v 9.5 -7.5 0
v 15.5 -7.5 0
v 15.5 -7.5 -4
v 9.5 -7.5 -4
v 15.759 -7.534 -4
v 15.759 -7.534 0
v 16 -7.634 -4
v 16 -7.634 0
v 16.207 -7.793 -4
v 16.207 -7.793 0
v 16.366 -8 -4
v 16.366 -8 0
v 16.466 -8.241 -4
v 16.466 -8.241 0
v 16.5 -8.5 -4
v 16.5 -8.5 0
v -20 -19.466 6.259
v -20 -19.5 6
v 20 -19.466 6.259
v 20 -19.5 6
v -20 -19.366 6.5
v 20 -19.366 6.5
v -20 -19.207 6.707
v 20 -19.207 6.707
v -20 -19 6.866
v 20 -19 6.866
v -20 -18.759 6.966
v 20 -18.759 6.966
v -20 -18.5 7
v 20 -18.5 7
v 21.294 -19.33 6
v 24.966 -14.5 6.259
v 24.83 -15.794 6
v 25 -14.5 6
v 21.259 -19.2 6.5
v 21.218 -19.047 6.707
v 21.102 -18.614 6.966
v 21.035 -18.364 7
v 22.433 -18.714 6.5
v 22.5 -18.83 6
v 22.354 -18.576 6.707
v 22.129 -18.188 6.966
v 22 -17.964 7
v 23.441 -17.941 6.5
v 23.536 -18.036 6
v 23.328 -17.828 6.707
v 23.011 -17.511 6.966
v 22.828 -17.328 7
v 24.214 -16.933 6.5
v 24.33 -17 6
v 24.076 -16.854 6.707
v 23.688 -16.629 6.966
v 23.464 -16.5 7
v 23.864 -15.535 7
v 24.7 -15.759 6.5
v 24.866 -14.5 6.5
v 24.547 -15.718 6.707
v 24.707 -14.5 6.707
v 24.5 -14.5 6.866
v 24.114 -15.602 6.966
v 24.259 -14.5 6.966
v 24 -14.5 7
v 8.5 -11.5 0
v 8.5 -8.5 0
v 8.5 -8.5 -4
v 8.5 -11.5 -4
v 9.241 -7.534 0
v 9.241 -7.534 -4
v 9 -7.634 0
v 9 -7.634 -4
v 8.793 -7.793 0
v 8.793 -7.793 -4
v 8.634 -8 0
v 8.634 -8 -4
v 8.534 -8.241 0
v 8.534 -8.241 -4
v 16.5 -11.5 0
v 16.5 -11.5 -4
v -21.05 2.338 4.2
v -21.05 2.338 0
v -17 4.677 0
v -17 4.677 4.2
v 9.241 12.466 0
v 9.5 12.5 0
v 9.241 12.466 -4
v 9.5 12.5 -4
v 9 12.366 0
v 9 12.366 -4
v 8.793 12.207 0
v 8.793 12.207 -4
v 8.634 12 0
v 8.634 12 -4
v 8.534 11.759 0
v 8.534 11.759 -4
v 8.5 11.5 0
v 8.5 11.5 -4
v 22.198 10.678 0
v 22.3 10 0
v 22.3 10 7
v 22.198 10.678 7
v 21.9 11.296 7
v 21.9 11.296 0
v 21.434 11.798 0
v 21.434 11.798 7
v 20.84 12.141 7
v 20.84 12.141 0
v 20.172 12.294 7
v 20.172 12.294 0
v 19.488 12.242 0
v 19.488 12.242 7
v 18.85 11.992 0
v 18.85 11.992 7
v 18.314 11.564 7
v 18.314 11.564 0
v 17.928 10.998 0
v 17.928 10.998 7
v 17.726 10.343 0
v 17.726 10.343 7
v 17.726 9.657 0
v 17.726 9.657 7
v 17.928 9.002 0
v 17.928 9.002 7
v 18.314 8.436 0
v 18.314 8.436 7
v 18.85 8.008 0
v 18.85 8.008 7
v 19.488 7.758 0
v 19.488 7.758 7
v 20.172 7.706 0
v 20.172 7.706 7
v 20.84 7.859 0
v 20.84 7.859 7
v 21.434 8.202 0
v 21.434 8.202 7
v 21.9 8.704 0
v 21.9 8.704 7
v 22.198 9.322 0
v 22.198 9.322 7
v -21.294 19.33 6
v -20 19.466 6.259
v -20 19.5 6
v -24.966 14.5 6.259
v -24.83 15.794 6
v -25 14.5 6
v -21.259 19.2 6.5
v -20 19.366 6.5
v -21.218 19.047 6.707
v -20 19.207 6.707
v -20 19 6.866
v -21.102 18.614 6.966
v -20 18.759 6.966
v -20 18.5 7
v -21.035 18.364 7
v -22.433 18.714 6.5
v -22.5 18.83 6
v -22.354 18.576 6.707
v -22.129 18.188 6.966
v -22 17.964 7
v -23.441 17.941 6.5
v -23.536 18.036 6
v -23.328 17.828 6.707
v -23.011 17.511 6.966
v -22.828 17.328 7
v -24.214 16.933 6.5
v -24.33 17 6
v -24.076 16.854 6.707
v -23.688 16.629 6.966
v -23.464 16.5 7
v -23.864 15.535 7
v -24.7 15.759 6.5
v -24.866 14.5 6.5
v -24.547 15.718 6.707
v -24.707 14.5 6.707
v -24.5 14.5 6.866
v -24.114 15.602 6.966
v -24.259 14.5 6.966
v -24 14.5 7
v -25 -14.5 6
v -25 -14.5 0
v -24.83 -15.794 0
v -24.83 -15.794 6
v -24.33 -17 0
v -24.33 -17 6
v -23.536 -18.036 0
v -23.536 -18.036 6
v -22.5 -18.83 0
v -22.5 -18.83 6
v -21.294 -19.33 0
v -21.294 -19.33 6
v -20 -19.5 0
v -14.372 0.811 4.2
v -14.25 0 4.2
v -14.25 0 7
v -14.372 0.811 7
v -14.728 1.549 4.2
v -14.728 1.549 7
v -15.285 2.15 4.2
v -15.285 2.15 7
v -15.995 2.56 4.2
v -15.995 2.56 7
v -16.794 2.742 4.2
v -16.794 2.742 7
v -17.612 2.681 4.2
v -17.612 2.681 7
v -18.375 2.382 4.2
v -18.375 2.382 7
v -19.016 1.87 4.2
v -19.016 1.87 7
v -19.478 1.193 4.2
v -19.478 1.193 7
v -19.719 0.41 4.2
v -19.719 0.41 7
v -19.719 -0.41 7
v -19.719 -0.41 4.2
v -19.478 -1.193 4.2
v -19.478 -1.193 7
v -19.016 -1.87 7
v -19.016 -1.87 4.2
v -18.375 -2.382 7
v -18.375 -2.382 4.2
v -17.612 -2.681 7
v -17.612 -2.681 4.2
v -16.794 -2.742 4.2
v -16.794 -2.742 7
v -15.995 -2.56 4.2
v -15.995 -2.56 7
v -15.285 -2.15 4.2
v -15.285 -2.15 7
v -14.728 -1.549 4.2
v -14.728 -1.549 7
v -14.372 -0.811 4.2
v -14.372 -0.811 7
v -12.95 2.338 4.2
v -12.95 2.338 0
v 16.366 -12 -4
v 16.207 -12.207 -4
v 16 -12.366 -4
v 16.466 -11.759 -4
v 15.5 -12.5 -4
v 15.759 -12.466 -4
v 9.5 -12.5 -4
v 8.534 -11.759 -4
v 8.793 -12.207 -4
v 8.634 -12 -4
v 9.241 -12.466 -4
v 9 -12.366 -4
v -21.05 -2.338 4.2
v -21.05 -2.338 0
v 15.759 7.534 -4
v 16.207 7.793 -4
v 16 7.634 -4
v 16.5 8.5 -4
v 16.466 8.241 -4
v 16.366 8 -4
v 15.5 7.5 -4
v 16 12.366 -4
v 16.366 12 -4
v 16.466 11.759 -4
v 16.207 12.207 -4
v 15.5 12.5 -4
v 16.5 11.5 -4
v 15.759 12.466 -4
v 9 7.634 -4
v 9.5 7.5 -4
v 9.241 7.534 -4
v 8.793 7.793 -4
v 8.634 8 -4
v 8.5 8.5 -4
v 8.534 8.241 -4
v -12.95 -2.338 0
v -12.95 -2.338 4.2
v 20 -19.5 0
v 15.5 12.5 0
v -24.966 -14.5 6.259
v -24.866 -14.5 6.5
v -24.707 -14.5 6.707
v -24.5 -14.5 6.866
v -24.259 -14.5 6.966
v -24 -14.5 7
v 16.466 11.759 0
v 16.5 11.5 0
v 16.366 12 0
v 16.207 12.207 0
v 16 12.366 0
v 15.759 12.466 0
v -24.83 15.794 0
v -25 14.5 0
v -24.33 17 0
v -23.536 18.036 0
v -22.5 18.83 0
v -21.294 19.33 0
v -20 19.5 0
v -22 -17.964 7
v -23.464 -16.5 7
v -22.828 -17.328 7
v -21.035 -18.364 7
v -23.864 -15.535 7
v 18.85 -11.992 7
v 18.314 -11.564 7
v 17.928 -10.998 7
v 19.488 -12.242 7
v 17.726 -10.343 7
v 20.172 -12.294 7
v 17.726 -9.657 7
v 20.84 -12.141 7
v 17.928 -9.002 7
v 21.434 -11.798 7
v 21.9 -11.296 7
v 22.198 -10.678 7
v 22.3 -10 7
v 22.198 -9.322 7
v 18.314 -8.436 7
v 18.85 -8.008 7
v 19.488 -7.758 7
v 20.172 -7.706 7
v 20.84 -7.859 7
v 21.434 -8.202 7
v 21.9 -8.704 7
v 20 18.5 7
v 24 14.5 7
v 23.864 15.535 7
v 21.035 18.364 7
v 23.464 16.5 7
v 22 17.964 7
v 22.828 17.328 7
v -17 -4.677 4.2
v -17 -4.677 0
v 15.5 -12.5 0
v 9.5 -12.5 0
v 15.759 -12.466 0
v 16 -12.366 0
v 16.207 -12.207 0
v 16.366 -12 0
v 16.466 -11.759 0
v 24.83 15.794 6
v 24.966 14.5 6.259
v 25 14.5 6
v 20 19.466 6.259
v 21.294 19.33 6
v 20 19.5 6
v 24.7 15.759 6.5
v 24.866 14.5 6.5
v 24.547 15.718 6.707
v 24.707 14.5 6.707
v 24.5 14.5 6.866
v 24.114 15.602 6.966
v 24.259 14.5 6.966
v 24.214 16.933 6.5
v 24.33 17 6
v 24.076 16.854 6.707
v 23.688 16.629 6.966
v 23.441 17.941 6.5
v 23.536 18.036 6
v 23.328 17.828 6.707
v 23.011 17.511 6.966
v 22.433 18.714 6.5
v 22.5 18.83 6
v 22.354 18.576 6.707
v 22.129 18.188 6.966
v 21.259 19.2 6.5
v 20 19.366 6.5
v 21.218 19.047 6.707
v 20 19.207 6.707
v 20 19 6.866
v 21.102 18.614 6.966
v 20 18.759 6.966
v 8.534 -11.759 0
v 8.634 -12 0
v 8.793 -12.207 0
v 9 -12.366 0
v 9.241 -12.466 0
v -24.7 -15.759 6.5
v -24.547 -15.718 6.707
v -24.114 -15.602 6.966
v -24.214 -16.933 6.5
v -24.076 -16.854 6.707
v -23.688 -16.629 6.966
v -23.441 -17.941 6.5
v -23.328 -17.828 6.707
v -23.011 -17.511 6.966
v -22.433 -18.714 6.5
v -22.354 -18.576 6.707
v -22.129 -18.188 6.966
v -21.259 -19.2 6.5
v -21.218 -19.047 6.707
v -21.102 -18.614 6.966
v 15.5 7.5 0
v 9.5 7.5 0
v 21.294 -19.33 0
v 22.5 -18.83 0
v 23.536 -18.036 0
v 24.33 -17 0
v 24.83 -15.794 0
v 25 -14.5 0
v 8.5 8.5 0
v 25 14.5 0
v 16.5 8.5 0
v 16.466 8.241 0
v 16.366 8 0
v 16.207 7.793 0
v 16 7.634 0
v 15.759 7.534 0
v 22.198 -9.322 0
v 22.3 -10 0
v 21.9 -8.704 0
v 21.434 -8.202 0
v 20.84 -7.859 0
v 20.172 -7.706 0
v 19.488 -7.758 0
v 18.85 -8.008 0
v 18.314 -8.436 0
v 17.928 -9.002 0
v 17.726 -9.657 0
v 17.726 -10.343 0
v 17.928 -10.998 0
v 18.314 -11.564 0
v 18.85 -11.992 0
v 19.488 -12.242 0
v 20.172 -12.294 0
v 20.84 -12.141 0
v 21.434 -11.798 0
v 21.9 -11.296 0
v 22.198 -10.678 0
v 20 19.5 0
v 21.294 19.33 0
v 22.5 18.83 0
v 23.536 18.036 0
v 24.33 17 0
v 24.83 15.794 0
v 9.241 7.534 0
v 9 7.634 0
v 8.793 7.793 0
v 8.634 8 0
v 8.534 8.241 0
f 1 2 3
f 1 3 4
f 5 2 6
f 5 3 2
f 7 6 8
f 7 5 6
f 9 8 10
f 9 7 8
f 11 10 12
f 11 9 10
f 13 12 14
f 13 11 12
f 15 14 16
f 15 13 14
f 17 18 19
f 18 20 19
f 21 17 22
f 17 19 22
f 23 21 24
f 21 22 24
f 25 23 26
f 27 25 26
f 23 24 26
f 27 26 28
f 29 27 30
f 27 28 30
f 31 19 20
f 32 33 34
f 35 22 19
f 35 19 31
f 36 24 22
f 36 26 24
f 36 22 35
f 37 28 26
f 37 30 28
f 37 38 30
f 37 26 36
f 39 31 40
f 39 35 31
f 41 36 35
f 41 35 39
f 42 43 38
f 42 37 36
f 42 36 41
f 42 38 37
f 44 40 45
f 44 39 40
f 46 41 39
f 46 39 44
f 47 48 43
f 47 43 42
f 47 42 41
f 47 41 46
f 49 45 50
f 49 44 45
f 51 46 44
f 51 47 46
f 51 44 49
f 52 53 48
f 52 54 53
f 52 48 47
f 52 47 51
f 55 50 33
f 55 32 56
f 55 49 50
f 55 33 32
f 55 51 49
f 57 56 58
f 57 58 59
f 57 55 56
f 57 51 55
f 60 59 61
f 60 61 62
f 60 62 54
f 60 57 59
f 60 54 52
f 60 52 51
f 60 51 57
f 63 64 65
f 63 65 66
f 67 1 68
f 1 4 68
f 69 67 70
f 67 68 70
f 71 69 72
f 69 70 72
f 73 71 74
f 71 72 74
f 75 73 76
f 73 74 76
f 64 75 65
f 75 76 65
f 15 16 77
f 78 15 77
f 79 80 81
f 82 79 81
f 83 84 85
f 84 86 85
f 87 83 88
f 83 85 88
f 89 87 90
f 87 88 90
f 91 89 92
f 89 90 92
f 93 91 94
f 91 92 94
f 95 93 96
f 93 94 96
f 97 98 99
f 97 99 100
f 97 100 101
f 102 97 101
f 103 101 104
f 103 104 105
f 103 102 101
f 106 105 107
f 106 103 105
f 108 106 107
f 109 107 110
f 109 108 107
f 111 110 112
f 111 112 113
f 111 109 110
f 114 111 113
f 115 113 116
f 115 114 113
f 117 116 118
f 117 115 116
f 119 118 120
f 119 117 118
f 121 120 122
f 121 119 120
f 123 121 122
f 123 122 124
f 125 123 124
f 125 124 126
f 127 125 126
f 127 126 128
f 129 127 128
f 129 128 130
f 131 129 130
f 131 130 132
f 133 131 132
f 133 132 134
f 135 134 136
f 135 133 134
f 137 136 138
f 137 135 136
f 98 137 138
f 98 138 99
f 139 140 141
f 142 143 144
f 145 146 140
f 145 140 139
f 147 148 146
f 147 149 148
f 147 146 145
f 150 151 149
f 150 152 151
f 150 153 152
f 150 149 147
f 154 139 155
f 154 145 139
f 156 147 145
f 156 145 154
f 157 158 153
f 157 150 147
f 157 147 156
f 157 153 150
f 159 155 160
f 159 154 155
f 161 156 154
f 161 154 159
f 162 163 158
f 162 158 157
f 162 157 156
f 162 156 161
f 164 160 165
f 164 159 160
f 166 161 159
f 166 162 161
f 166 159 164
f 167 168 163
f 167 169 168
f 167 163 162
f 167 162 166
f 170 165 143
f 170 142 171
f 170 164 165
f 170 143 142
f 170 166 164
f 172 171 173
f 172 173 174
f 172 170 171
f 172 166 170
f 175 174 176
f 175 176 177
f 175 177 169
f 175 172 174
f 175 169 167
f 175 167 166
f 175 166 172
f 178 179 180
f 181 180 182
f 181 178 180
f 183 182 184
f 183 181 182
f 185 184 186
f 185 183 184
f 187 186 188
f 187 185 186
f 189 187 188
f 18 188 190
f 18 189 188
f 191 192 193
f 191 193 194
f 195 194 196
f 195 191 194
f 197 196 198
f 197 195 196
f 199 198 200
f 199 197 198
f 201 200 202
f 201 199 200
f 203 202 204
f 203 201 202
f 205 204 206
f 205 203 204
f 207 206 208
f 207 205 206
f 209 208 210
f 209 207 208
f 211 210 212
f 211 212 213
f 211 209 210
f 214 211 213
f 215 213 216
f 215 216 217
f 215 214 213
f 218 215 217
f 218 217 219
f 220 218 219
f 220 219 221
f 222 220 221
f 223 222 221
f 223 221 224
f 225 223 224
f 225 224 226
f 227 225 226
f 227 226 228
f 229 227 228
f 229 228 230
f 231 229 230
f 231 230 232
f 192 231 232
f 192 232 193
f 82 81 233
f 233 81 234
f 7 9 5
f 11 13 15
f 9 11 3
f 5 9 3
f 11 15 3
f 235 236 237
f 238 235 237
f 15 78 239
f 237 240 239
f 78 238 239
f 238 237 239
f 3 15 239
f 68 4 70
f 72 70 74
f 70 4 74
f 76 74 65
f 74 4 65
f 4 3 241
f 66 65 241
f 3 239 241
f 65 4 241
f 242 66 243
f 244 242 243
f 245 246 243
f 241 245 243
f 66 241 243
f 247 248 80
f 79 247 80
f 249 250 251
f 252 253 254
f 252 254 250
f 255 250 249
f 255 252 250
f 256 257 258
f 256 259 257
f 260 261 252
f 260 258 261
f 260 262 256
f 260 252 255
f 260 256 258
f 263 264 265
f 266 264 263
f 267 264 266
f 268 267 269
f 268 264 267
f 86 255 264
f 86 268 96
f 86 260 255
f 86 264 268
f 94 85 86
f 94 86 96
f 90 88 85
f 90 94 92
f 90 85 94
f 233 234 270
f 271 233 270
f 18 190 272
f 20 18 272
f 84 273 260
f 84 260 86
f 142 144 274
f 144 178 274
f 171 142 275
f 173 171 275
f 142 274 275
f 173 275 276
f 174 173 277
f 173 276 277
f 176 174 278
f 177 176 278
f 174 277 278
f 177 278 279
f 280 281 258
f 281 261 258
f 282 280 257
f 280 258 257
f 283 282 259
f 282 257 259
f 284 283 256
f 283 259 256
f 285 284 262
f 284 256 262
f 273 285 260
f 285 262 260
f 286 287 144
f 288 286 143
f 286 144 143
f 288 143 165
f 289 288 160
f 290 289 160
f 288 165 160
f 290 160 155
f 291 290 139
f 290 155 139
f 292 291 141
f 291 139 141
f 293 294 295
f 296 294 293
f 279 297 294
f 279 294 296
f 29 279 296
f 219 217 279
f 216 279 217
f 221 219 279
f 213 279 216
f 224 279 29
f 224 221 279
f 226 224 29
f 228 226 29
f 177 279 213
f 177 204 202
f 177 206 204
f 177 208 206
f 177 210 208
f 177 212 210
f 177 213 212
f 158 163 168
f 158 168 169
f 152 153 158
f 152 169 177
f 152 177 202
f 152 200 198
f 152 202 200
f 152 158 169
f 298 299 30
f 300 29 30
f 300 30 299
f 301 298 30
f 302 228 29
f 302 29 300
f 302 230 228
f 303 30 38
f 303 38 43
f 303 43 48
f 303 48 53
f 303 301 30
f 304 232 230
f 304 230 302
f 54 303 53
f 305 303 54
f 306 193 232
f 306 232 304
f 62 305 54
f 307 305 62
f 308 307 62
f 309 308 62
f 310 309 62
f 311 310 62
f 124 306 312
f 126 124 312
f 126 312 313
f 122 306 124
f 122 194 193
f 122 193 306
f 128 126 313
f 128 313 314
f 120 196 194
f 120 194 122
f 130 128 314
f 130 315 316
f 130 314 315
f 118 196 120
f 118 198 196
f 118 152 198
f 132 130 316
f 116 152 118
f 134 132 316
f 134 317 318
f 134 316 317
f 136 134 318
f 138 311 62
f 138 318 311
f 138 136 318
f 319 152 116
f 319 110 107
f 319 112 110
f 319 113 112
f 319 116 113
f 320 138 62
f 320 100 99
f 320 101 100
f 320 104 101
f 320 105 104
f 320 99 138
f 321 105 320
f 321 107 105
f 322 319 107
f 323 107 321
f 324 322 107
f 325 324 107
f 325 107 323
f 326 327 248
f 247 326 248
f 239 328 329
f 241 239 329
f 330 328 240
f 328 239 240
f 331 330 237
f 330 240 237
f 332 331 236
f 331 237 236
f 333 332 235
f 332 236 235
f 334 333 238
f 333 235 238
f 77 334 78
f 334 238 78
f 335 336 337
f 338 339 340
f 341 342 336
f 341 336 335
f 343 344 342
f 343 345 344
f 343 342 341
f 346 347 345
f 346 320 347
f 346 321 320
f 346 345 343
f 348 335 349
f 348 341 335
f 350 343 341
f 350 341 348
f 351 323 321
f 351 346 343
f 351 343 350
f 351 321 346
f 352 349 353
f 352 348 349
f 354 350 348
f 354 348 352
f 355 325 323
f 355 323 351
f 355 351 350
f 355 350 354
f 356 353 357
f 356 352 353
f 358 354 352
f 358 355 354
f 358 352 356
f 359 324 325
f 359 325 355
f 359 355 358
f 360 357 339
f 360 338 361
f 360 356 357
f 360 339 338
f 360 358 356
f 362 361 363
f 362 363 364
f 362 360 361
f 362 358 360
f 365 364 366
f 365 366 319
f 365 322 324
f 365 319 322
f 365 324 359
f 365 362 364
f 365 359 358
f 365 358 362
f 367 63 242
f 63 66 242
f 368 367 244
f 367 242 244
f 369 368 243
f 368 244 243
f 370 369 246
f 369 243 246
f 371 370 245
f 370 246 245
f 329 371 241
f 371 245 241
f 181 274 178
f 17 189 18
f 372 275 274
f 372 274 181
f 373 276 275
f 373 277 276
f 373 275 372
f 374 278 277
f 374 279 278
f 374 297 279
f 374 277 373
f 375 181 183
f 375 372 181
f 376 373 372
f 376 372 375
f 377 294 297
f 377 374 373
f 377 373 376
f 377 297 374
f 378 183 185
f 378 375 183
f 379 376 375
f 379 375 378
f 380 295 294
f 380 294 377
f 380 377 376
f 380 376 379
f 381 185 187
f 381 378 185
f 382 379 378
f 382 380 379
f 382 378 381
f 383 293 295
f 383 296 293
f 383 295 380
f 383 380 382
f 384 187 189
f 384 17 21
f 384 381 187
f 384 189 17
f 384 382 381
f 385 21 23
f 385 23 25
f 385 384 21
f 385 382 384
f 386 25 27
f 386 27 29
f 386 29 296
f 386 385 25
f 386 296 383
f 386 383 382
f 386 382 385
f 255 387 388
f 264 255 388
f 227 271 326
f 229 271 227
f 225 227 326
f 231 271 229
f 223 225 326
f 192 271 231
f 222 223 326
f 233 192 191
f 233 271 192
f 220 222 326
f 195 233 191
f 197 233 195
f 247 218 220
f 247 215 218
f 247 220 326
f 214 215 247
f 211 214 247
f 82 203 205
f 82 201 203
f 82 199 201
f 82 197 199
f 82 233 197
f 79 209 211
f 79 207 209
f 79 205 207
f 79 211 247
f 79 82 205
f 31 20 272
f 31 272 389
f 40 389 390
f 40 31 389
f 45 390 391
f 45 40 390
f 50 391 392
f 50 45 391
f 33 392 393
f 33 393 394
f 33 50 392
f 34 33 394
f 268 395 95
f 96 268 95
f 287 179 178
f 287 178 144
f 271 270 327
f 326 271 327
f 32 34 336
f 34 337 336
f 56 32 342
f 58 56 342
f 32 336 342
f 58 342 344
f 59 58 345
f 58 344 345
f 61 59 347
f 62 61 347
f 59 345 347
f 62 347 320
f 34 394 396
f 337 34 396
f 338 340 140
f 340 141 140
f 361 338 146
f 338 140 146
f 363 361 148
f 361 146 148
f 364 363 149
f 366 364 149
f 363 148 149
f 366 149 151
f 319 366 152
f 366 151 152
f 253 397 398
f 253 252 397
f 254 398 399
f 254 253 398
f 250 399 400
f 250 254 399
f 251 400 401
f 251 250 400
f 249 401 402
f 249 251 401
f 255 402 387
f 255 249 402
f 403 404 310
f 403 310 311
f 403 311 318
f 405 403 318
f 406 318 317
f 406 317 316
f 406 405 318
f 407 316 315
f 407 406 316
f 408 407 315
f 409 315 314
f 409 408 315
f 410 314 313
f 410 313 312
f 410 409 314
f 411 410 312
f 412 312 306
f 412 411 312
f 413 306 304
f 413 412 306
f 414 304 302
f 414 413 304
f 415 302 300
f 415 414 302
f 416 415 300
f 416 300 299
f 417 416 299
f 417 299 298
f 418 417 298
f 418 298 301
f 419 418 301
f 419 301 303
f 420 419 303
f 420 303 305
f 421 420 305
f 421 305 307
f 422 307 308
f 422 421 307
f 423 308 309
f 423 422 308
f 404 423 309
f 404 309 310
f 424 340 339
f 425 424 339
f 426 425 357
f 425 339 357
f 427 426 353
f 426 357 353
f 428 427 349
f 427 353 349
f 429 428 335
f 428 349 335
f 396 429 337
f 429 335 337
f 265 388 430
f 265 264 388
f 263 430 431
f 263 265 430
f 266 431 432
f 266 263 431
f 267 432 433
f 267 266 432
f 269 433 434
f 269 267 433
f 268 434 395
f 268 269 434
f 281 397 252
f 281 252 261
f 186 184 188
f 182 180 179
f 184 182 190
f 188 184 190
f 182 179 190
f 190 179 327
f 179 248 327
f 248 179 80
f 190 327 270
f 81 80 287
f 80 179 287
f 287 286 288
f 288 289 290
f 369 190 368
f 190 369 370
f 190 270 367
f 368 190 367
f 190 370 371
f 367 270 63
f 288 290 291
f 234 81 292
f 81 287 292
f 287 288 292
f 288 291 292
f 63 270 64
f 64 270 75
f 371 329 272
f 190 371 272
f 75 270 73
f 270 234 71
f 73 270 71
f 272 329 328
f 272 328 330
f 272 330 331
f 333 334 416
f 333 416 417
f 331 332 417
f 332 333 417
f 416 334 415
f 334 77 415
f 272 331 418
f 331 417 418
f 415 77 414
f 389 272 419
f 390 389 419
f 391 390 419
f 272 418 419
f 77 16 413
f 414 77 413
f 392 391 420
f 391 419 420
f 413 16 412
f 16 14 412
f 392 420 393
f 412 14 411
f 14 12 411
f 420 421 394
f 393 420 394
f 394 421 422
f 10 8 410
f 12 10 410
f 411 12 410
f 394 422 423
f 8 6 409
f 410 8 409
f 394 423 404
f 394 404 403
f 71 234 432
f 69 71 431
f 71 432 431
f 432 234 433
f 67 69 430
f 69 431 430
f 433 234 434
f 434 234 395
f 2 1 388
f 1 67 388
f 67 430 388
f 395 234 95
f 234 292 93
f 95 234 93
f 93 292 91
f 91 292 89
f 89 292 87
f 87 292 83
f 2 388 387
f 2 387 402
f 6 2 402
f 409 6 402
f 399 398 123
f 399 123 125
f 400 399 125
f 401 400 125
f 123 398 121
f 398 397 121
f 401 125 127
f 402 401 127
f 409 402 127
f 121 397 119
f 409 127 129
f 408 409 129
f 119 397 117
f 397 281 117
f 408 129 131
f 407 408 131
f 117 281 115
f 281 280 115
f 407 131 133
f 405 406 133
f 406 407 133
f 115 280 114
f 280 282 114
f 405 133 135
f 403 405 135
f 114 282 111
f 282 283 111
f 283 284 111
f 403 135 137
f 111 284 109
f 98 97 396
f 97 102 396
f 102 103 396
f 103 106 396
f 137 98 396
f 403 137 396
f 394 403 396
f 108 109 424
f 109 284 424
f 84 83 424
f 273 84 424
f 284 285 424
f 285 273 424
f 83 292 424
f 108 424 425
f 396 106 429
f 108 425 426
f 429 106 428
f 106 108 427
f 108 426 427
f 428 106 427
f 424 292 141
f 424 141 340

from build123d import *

# Parameters (mm, degrees)
SKETCH1_W           = 50
SKETCH1_H           = 39
SKETCH1_R           = 2.75
SKETCH1_R_2         = 2.3
BOSS_EXTRUDE1_DEPTH = 7
CUT_EXTRUDE1_DEPTH  = 4.2
FILLET1_R           = 5
SKETCH3_W           = 8
SKETCH3_H           = 5
BOSS_EXTRUDE2_DEPTH = 4
FILLET2_R           = 1
FILLET3_R           = 1
FILLET4_R           = 1


with BuildPart() as part:
    # Sketch1 → Boss-Extrude1 (new body)
    with BuildSketch(Plane.XY):
        Rectangle(SKETCH1_W, SKETCH1_H)
        with Locations((-17, 0)):
            Circle(SKETCH1_R, mode=Mode.SUBTRACT)
        with Locations((20, 10)):
            Circle(SKETCH1_R_2, mode=Mode.SUBTRACT)
        with Locations((20, -10)):
            Circle(SKETCH1_R_2, mode=Mode.SUBTRACT)
    extrude(amount=BOSS_EXTRUDE1_DEPTH)

    # Sketch2 → Cut-Extrude1 (cut)
    with BuildSketch(Plane(origin=(0, 0, 0), x_dir=(-1, 0, 0), z_dir=(0, 0, -1))):
        Polygon((17, 4.67653718), (12.95, 2.33826859), (12.95, -2.33826859), (17, -4.67653718), (21.05, -2.33826859), (21.05, 2.33826859), align=None)
    extrude(amount=-CUT_EXTRUDE1_DEPTH, mode=Mode.SUBTRACT)

    # Fillet1
    fillet1_edges = [part.edges().sort_by_distance(p)[0] for p in [
        (25, -19.5, 3.5),
        (-25, -19.5, 3.5),
        (-25, 19.5, 3.5),
        (25, 19.5, 3.5),
    ]]
    fillet(fillet1_edges, radius=FILLET1_R)

    # Sketch3 → Boss-Extrude2 (add)
    with BuildSketch(Plane(origin=(0, 0, 0), x_dir=(-1, 0, 0), z_dir=(0, 0, -1))):
        with Locations((-12.5, 10)):
            Rectangle(SKETCH3_W, SKETCH3_H)
    boss_extrude2 = extrude(amount=BOSS_EXTRUDE2_DEPTH)

    # Mirror1: Boss-Extrude2 across plane
    add(boss_extrude2.mirror(Plane.ZX))

    # Fillet2
    fillet2_edges = [part.edges().sort_by_distance(p)[0] for p in [
        (8.5, 7.5, -2),
        (8.5, 12.5, -2),
        (16.5, 12.5, -2),
        (16.5, 7.5, -2),
    ]]
    fillet(fillet2_edges, radius=FILLET2_R)

    # Fillet3
    fillet3_edges = [part.edges().sort_by_distance(p)[0] for p in [
        (8.5, -12.5, -2),
        (8.5, -7.5, -2),
        (16.5, -7.5, -2),
        (16.5, -12.5, -2),
    ]]
    fillet(fillet3_edges, radius=FILLET3_R)

    # Fillet4
    fillet4_edges = [part.edges().sort_by_distance(p)[0] for p in [
        (25, 0, 7),
        (0, -19.5, 7),
        (0, 19.5, 7),
        (-25, 0, 7),
        (23.535533906, 18.035533906, 7),
        (-23.535533906, 18.035533906, 7),
        (-23.535533906, -18.035533906, 7),
        (23.535533906, -18.035533906, 7),
    ]]
    fillet(fillet4_edges, radius=FILLET4_R)


solid = part.part
